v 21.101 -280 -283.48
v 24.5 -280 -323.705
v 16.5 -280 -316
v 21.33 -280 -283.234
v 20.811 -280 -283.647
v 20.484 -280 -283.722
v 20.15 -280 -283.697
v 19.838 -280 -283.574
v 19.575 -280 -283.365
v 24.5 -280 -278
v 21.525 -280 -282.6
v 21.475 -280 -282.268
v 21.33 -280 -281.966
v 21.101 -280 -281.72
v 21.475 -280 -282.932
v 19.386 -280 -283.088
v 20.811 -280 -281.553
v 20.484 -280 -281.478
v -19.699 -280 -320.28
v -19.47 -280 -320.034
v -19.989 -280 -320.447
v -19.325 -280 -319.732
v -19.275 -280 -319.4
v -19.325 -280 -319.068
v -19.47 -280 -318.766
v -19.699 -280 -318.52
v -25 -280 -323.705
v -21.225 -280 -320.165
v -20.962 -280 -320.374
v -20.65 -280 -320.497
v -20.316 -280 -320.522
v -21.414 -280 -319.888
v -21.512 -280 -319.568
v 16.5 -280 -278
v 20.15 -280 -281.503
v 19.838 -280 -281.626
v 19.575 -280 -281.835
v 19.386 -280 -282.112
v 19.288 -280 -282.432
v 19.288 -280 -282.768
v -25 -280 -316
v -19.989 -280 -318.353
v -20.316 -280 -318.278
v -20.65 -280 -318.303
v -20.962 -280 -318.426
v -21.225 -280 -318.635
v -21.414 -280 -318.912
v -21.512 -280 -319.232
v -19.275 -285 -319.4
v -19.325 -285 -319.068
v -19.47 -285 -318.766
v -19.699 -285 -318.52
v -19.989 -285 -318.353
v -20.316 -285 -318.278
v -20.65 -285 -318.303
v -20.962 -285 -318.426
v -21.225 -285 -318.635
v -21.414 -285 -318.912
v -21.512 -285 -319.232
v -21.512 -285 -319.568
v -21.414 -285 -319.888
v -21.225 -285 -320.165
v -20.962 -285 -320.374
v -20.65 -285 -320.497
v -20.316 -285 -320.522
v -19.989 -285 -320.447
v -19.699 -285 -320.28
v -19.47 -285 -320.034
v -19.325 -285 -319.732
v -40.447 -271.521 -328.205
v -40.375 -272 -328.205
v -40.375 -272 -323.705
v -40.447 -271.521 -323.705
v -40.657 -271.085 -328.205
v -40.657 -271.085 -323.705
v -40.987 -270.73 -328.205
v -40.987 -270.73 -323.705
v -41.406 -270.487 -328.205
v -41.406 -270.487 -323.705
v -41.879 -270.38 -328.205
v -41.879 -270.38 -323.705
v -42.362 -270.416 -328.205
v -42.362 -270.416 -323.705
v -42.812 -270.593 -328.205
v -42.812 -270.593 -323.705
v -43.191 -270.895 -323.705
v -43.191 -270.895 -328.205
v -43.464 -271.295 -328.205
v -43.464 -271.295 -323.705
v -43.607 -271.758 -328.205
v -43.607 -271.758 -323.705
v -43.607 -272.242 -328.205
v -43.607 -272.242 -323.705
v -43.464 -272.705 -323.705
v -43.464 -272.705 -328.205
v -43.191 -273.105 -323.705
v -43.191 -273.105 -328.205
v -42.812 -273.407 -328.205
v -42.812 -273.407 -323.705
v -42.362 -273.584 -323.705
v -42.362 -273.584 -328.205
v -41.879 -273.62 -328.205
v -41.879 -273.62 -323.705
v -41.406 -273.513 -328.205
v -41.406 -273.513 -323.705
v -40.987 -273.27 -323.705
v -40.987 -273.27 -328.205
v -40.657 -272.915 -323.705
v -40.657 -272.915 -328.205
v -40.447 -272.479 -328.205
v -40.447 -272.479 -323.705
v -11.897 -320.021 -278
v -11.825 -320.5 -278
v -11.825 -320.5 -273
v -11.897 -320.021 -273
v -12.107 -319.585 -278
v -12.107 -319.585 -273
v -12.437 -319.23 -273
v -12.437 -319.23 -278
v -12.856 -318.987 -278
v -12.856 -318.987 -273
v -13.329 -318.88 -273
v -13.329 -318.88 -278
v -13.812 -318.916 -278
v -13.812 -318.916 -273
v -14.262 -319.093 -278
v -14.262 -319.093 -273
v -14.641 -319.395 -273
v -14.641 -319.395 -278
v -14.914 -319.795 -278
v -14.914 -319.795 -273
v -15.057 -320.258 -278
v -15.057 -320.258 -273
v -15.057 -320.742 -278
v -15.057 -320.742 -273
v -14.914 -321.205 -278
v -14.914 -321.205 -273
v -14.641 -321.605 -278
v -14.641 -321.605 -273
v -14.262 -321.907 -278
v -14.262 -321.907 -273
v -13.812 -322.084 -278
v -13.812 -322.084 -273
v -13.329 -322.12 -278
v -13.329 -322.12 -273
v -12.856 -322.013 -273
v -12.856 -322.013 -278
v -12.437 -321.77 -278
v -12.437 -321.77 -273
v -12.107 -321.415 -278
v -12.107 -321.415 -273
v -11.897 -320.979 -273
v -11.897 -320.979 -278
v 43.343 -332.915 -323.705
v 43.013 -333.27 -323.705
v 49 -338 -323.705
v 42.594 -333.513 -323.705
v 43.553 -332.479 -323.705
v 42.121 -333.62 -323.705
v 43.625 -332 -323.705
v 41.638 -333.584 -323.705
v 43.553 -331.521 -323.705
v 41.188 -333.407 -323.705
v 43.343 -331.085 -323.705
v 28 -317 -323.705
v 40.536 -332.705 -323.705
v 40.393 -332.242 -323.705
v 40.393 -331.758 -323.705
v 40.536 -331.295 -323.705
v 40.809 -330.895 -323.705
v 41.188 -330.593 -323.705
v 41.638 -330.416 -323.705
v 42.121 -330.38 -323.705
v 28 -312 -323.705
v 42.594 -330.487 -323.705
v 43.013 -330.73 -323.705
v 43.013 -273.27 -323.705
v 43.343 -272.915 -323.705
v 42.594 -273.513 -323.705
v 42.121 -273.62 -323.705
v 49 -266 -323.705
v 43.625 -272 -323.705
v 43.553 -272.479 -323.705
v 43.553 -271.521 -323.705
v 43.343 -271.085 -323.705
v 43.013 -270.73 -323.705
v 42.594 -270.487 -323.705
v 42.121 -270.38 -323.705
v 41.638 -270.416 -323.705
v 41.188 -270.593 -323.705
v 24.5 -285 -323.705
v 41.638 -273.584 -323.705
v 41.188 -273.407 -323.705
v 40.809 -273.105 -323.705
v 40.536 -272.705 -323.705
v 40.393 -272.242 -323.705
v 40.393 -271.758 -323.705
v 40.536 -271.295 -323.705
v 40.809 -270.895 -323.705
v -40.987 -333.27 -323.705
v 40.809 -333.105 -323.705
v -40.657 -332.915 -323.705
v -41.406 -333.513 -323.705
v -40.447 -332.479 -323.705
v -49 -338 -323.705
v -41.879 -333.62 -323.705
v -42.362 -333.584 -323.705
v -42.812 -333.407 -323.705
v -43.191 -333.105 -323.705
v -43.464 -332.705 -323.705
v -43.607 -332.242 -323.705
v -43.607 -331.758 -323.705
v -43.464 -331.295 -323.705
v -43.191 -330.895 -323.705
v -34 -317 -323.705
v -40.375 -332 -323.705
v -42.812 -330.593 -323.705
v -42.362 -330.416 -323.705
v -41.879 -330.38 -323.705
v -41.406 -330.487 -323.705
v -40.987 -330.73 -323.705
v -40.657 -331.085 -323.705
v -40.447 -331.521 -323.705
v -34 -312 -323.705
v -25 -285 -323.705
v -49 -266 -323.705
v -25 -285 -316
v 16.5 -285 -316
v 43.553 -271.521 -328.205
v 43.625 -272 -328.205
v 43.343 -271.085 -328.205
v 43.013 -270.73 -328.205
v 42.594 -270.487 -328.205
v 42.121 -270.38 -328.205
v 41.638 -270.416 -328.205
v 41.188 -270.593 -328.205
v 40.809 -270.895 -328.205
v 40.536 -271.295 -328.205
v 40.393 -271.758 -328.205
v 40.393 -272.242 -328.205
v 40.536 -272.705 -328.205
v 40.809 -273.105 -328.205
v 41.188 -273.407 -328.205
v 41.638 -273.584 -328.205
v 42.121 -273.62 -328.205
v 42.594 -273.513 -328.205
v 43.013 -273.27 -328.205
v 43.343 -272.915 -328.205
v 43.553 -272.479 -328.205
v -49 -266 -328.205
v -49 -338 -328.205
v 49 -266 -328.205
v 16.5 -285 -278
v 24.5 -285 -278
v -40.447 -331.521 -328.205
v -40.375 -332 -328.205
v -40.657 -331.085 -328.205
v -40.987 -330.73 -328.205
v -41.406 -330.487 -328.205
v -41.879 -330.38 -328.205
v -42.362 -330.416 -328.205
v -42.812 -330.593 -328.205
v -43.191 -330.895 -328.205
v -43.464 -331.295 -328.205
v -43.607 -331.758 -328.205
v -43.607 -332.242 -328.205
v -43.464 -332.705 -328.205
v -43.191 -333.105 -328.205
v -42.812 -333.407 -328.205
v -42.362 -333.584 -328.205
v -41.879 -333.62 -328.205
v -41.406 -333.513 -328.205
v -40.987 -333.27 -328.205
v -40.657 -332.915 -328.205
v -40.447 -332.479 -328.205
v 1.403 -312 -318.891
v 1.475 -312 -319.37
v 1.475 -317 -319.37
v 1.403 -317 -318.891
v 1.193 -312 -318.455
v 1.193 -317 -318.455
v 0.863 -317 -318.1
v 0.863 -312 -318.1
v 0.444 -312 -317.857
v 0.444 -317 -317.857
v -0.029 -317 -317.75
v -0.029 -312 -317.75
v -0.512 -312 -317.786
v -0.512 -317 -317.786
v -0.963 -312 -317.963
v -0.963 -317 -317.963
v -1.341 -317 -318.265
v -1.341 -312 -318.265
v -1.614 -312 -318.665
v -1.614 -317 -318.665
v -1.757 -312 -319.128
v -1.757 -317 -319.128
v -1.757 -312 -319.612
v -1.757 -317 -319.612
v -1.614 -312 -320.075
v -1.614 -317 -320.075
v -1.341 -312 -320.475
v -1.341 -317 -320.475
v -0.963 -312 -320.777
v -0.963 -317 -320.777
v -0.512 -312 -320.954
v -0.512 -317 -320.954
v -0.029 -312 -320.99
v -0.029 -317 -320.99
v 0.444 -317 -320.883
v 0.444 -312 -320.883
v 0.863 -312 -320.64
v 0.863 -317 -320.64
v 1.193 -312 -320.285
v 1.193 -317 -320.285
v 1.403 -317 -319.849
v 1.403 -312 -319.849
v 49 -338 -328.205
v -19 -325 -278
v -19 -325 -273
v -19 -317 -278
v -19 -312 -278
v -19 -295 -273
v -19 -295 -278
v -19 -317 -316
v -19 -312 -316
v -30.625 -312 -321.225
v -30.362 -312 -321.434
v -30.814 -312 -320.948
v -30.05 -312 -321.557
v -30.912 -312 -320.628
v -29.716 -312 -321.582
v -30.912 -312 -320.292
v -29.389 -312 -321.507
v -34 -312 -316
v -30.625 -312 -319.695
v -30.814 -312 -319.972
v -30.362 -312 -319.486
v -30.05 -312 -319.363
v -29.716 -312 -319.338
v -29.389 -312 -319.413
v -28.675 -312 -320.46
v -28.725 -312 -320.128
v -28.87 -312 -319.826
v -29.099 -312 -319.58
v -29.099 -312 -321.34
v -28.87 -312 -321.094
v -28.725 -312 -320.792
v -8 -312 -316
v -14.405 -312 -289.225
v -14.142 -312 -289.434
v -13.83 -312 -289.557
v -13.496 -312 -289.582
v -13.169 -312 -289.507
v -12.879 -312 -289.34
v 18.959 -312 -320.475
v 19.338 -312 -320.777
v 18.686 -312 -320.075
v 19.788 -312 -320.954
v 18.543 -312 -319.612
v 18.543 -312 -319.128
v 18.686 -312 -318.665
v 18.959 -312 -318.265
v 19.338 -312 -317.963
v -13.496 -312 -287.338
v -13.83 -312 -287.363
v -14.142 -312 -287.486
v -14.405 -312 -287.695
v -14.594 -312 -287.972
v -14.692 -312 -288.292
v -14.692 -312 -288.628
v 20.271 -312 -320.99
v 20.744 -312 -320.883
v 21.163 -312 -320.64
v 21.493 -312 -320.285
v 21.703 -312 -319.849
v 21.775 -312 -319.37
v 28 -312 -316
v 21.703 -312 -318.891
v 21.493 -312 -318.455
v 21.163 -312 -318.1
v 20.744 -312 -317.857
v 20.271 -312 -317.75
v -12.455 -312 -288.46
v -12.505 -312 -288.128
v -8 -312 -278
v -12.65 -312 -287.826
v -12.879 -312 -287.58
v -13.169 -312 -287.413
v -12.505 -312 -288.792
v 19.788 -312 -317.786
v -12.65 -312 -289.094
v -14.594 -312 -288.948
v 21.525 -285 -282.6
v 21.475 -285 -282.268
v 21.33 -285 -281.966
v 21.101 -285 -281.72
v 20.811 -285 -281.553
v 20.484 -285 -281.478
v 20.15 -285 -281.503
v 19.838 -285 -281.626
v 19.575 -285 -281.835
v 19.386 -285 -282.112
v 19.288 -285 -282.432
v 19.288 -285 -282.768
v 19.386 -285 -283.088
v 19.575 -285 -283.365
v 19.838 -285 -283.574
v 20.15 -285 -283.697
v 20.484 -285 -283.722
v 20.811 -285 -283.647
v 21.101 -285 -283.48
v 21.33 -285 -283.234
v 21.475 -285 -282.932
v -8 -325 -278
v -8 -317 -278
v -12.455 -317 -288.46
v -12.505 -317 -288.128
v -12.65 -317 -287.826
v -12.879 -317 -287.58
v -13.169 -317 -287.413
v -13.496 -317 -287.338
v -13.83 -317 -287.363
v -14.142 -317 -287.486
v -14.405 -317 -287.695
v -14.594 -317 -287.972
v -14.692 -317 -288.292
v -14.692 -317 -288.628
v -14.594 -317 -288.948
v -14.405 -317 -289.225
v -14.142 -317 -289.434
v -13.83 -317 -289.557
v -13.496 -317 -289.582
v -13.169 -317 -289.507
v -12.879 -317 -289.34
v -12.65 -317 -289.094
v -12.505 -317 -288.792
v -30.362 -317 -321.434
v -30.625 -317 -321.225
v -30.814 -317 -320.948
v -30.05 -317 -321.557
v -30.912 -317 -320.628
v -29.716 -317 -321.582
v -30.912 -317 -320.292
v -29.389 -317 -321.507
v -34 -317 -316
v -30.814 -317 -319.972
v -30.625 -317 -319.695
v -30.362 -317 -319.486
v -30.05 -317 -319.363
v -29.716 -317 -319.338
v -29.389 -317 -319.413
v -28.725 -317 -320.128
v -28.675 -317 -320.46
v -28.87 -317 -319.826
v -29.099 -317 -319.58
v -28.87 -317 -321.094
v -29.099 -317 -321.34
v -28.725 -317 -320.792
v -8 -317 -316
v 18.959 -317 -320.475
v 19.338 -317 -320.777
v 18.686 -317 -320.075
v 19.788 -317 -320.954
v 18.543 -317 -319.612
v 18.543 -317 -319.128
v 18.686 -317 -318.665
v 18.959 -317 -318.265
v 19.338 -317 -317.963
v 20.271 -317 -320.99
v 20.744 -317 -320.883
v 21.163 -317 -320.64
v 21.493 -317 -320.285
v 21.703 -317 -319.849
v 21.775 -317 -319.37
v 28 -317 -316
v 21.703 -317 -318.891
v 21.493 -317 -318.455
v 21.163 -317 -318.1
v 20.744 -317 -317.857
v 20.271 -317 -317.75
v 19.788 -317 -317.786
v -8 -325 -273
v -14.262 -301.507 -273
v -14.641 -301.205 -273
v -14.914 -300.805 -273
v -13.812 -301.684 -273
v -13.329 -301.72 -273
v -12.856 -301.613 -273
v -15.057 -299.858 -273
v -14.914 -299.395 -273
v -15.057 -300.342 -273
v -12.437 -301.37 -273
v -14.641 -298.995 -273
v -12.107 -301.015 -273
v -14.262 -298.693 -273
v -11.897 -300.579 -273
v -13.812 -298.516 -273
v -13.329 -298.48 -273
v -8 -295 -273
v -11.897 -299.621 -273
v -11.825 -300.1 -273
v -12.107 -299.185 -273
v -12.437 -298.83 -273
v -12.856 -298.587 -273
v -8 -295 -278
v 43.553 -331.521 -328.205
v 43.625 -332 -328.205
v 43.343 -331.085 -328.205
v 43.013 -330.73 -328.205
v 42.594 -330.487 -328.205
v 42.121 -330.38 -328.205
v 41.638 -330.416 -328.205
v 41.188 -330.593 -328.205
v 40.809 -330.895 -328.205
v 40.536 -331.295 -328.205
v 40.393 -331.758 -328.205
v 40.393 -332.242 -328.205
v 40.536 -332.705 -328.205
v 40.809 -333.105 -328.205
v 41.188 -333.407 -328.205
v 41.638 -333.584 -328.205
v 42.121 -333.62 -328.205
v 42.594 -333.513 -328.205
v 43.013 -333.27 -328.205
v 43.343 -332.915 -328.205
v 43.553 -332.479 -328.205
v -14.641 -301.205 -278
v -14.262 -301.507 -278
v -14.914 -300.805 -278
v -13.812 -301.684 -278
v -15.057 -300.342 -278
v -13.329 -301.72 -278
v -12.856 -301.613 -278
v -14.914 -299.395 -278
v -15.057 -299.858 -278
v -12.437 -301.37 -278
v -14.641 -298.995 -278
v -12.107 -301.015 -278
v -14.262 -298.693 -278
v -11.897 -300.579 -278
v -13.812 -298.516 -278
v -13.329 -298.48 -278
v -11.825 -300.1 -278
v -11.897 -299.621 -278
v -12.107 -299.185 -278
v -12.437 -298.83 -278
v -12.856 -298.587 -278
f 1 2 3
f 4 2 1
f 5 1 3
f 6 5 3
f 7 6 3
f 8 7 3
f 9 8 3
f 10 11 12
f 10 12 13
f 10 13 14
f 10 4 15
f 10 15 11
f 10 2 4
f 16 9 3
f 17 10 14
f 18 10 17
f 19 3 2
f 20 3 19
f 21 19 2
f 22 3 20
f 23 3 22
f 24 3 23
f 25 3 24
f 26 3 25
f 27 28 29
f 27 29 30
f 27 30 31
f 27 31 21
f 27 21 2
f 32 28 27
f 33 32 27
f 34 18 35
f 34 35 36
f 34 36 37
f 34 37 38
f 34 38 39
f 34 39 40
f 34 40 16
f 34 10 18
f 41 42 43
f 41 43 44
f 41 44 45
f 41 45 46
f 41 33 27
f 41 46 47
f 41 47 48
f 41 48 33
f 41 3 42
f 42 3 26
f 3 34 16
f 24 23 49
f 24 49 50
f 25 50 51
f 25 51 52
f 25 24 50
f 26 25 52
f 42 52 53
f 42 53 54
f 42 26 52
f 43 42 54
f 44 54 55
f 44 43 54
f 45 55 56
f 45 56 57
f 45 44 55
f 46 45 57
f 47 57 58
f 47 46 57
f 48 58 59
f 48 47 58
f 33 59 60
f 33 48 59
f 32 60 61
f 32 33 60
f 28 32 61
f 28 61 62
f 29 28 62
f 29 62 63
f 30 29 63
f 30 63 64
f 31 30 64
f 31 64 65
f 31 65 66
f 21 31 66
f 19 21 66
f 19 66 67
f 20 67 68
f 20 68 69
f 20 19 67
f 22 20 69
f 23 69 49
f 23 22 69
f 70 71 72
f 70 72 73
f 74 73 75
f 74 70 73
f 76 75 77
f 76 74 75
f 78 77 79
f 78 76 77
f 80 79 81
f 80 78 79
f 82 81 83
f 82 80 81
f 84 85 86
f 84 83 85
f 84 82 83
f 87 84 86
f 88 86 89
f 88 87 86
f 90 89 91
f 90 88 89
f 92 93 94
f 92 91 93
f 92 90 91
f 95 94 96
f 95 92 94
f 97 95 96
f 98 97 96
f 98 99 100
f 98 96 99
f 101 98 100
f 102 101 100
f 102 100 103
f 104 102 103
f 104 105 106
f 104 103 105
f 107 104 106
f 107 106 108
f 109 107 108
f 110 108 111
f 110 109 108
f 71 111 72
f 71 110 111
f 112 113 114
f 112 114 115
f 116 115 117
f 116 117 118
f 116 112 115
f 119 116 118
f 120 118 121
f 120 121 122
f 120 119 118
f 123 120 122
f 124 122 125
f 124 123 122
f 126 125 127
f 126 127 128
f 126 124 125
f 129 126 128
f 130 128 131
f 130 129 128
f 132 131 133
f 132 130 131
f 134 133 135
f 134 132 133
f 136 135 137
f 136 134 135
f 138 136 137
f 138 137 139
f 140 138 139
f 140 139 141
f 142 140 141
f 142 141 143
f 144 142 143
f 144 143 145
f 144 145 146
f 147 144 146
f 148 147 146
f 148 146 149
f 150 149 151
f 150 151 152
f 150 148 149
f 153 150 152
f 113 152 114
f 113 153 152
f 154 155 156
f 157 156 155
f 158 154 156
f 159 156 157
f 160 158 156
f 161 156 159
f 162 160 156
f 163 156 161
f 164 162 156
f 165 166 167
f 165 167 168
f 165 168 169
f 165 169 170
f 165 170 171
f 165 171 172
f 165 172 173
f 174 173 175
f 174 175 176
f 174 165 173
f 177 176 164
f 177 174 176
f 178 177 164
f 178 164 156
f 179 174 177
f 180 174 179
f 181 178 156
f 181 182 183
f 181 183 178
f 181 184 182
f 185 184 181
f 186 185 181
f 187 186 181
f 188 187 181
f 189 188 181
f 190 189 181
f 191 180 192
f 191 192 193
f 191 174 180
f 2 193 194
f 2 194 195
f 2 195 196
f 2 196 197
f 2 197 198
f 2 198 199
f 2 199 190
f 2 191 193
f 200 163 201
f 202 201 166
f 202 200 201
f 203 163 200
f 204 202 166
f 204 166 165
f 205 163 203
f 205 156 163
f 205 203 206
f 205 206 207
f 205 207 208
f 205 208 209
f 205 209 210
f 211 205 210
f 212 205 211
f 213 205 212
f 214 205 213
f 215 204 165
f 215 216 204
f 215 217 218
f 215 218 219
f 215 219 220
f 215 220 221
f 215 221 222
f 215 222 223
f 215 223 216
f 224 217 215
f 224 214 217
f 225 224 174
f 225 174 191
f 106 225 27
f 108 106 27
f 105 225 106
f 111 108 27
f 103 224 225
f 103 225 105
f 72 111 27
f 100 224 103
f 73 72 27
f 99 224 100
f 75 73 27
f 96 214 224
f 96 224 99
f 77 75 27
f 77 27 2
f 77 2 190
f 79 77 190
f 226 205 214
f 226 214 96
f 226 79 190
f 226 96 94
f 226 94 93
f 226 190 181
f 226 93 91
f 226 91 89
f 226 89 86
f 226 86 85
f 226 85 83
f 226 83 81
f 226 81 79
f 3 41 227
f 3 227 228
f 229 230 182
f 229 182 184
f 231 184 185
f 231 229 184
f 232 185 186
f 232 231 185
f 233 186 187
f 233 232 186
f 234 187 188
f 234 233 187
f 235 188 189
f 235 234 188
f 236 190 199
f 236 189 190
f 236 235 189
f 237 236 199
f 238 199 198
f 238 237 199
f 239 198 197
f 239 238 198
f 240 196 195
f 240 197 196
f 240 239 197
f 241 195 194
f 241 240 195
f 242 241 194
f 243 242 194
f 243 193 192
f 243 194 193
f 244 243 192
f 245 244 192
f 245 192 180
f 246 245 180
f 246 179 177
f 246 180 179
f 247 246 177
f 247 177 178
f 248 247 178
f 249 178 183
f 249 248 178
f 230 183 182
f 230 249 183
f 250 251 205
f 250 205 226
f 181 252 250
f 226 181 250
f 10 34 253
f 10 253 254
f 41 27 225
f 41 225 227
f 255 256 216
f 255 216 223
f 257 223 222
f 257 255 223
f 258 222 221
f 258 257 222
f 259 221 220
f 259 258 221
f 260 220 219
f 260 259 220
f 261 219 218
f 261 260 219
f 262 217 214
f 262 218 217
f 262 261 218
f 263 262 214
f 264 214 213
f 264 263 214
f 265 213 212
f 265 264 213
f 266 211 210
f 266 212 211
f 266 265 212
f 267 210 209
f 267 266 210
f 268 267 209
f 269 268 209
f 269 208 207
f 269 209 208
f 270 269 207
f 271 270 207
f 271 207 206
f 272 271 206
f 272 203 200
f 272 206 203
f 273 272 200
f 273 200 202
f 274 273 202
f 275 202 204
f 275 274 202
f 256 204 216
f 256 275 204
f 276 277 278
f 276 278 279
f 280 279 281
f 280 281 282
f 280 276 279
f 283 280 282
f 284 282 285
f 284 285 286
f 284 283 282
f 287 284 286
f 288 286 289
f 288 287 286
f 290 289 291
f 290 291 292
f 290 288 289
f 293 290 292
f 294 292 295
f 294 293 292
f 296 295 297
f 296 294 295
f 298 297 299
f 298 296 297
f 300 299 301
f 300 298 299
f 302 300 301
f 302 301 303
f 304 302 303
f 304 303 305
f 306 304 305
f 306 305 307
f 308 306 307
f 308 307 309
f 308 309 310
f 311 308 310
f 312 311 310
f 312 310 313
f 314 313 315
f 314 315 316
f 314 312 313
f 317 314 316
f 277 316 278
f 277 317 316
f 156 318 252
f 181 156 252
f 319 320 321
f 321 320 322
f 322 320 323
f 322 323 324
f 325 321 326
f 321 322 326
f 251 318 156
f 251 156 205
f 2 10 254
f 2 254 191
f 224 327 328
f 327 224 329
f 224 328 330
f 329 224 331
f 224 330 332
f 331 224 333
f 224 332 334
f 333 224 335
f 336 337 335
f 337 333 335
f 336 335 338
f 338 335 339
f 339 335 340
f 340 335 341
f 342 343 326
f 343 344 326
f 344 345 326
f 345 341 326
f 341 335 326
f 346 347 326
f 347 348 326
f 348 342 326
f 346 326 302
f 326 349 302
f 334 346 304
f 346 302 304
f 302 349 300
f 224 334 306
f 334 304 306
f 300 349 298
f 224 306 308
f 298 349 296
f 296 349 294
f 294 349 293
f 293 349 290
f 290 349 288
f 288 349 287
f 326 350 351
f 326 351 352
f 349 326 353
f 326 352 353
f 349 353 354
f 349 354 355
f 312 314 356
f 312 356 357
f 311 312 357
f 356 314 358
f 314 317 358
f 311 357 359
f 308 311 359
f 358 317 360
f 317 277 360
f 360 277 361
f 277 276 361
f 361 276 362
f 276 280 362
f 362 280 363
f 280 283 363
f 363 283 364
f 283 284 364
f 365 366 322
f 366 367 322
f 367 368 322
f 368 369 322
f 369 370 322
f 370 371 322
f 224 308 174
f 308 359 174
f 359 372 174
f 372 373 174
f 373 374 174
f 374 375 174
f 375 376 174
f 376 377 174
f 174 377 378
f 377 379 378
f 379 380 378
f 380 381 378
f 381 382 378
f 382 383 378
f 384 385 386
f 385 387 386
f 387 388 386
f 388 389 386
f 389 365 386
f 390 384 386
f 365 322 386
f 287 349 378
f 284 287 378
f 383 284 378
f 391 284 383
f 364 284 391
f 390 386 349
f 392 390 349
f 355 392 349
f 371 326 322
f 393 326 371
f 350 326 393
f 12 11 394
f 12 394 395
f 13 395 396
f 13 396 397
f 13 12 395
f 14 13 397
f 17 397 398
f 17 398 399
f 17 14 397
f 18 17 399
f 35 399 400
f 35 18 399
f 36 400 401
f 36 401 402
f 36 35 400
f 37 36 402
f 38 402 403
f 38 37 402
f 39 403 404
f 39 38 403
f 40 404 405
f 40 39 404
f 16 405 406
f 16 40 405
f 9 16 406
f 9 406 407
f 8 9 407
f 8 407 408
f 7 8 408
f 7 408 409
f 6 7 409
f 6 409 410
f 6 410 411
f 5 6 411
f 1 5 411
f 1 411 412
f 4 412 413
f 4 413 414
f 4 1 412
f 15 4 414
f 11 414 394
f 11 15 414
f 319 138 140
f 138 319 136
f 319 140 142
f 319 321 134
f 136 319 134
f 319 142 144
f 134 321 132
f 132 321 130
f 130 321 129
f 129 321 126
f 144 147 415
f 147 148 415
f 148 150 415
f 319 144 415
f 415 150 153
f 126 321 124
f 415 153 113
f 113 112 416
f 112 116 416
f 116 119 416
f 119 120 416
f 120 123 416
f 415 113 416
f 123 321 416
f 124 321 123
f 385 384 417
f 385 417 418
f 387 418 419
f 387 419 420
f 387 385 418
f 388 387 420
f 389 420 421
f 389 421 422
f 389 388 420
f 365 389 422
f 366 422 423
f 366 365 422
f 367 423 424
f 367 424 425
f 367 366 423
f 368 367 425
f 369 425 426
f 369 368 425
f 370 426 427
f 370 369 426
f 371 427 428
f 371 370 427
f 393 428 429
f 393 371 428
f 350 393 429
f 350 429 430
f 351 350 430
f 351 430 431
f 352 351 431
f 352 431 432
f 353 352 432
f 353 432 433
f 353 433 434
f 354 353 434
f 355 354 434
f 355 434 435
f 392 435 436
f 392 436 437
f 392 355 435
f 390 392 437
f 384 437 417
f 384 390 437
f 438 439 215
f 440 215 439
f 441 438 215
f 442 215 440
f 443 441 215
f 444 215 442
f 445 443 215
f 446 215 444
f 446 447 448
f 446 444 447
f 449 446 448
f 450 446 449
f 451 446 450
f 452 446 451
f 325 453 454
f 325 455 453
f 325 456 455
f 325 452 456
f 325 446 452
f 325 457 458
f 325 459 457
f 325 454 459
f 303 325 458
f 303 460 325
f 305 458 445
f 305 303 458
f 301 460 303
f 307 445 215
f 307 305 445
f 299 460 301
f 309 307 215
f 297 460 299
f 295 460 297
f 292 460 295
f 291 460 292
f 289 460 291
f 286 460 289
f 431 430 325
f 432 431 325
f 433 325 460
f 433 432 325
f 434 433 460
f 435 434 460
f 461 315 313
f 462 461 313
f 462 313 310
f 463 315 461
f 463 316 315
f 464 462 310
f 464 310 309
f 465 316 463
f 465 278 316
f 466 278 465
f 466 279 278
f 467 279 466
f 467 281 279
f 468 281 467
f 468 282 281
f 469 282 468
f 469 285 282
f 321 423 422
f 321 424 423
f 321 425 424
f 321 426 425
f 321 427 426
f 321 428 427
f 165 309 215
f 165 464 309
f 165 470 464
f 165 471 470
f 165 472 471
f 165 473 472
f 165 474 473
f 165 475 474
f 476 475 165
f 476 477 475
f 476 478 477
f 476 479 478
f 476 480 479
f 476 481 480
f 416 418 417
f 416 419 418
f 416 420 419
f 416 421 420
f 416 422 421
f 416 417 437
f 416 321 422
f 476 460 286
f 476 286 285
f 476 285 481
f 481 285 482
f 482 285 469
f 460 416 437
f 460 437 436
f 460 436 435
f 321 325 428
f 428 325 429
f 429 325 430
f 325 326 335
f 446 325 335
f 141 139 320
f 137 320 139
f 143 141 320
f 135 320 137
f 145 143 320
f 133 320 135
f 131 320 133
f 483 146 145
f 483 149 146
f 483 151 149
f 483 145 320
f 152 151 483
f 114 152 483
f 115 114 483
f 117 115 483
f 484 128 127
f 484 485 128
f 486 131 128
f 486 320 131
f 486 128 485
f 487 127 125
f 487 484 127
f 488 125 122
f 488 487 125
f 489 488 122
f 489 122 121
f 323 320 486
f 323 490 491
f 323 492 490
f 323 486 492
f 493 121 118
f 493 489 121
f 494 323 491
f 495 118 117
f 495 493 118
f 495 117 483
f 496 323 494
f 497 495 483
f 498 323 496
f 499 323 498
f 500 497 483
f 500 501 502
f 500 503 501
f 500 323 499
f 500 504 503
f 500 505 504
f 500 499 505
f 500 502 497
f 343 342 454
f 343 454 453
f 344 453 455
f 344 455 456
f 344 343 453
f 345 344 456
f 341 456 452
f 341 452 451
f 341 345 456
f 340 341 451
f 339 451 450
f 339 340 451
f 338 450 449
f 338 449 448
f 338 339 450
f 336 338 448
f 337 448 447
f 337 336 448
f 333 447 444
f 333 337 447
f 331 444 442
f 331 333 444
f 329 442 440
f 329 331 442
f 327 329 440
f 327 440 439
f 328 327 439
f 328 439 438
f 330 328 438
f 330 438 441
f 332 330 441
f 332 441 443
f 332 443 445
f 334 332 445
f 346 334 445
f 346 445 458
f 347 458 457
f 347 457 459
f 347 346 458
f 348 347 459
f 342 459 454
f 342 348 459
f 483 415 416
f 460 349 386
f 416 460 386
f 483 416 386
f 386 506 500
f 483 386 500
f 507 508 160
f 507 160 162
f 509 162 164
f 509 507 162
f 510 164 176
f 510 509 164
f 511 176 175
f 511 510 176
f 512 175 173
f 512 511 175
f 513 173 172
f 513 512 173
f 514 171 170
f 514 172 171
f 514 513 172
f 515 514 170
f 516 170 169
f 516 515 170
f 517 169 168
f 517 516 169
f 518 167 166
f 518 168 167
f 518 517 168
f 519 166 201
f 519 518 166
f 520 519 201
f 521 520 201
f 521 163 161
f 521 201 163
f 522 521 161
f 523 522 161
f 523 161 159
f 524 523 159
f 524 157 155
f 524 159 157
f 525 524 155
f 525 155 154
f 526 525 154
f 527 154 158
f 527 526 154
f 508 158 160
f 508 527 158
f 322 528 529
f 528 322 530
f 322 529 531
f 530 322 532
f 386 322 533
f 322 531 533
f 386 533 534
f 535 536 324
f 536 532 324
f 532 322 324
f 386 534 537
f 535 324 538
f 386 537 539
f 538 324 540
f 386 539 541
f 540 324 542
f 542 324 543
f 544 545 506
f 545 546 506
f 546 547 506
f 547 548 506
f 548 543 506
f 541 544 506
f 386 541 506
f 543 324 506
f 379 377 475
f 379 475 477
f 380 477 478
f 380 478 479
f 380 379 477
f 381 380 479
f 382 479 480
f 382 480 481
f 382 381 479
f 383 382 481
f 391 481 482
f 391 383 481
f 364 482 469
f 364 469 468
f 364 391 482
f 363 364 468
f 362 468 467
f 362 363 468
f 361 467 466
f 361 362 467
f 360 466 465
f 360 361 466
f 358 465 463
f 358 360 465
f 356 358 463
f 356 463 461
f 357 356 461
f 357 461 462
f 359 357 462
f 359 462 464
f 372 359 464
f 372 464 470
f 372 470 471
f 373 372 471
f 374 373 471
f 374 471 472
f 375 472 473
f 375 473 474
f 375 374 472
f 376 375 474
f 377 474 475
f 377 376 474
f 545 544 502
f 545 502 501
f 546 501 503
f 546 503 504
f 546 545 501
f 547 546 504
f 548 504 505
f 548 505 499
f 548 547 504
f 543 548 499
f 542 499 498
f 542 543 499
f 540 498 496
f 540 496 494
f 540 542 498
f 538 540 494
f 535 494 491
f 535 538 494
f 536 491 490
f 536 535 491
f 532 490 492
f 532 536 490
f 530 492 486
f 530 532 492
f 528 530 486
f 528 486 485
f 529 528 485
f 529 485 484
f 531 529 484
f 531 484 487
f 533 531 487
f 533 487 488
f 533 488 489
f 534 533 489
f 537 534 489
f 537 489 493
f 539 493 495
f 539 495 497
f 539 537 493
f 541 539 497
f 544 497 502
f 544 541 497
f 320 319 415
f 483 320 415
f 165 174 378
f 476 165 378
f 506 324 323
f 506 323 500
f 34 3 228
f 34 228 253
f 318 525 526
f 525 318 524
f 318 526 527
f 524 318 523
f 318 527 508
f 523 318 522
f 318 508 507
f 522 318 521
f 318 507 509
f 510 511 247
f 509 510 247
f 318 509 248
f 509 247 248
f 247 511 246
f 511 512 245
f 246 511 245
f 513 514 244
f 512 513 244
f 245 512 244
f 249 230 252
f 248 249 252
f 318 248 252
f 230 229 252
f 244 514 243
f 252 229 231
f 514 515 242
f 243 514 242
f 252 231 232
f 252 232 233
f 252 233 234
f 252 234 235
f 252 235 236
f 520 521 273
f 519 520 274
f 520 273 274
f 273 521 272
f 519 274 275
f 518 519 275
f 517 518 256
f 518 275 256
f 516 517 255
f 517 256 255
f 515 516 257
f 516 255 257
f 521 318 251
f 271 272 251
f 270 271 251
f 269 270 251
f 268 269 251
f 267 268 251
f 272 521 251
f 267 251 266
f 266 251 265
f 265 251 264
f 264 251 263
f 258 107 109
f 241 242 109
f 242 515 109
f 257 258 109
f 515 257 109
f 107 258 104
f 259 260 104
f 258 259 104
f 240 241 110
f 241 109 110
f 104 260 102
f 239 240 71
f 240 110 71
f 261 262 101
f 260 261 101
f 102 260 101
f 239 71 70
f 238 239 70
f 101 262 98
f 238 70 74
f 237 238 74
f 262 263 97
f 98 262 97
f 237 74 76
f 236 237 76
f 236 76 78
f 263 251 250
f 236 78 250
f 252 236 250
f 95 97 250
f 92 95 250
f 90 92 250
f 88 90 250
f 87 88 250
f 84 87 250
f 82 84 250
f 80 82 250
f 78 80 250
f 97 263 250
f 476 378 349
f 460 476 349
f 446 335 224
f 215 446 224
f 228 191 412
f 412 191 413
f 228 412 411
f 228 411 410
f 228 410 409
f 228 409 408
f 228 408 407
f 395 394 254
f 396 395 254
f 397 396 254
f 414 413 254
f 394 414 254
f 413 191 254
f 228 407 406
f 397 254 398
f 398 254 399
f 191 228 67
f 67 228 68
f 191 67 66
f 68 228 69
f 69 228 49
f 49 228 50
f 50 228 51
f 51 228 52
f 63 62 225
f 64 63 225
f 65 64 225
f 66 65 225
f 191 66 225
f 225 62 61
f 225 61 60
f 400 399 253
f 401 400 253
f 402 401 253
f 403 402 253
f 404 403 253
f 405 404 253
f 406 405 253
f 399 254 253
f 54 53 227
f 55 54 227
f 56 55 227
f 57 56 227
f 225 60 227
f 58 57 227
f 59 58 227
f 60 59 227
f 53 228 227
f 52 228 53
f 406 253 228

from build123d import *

# Parameters (mm, degrees)
SKETCH035_R                               = 1.625
EXTRUDE011_DEPTH                          = 20
SKETCH020_W                               = 11
SKETCH020_H                               = 30
SKETCH020_R                               = 1.625
EXTRUDE004_DEPTH                          = 5
SKETCH022_AS_DRAWN_W                      = 72
SKETCH022_AS_DRAWN_H                      = 98
EXTRUDE006_DEPTH                          = 4.5
EXTRUDE006_ONTO_SKETCH022_ROLL_ANGLE      = 0
EXTRUDE006_ONTO_SKETCH022_PITCH_ANGLE     = 0
EXTRUDE006_ONTO_SKETCH022_PLACEMENT_ANGLE = 90.000003
SKETCH019_R                               = 1.125
SKETCH019_R_2                             = 1.625
EXTRUDE003_DEPTH                          = 5
SKETCH021_R                               = 1.125
EXTRUDE005_DEPTH                          = 5


with BuildPart() as basecuts001:
    # Sketch035 → Extrude011 (new body)
    with BuildSketch(Plane.XY):
        with Locations((-42, -332)):
            Circle(SKETCH035_R)
        with Locations((42, -332)):
            Circle(SKETCH035_R)
        with Locations((42, -272)):
            Circle(SKETCH035_R)
        with Locations((-42, -272)):
            Circle(SKETCH035_R)
    extrude(amount=EXTRUDE011_DEPTH)


with BuildPart() as basecuts001_1:
    # Extrude011 placement: moved
    add(basecuts001.part.moved(Location((0, 0, -329))))


with BuildPart() as gpshold:
    # Sketch020 → Extrude004 (new body)
    with BuildSketch(Plane.XY):
        with Locations((-13.5, -310)):
            Rectangle(SKETCH020_W, SKETCH020_H)
        with Locations((-13.45, -300.1)):
            Circle(SKETCH020_R, mode=Mode.SUBTRACT)
        with Locations((-13.45, -320.5)):
            Circle(SKETCH020_R, mode=Mode.SUBTRACT)
    extrude(amount=EXTRUDE004_DEPTH)


with BuildPart() as gpshold_1:
    # Extrude004 placement: moved
    add(gpshold.part.moved(Location((0, 0, -278))))


with BuildPart() as base:
    # Sketch022 as drawn → Extrude006 (new)
    with BuildSketch(Plane.XY):
        Rectangle(SKETCH022_AS_DRAWN_W, SKETCH022_AS_DRAWN_H)
    extrude(amount=EXTRUDE006_DEPTH)


with BuildPart() as base_1:
    # Extrude006 onto Sketch022 roll: moved
    add(base.part.rotate(Axis((0, 0, 0), (1, 0, 0)), EXTRUDE006_ONTO_SKETCH022_ROLL_ANGLE))


with BuildPart() as base_2:
    # Extrude006 onto Sketch022 pitch: moved
    add(base_1.part.rotate(Axis((0, 0, 0), (0, 1, 0)), EXTRUDE006_ONTO_SKETCH022_PITCH_ANGLE))


with BuildPart() as base_3:
    # Extrude006 onto Sketch022 placement: moved
    add(base_2.part.moved(Location((0, -302, -283.455178))).rotate(Axis((0, -302, -283.455178), (0, 0, 1)), EXTRUDE006_ONTO_SKETCH022_PLACEMENT_ANGLE))


with BuildPart() as base_4:
    # Extrude006 placement: moved
    add(base_3.part.moved(Location((0, 0, -44.75))))


with BuildPart() as i2chold:
    # Sketch019 → Extrude003 (new body)
    with BuildSketch(Plane.XZ):
        Polygon((28, -324), (28, -316), (-8, -316), (-8, -278), (-19, -278), (-19, -316), (-34, -316), (-34, -324), align=None)
        with Locations((-29.8, -320.46)):
            Circle(SKETCH019_R, mode=Mode.SUBTRACT)
        with Locations((-13.58, -288.46)):
            Circle(SKETCH019_R, mode=Mode.SUBTRACT)
        with Locations((-0.15, -319.37)):
            Circle(SKETCH019_R_2, mode=Mode.SUBTRACT)
        with Locations((20.15, -319.37)):
            Circle(SKETCH019_R_2, mode=Mode.SUBTRACT)
    extrude(amount=EXTRUDE003_DEPTH)


with BuildPart() as i2chold_1:
    # Extrude003 placement: moved
    add(i2chold.part.moved(Location((0, -312, 0))))


with BuildPart() as base002:
    # Sketch021 (on Extrude) → Extrude005 (new body)
    with BuildSketch(Plane.XZ.offset(312)):
        Polygon((-25, -324), (-25, -316), (16.5, -316), (16.5, -278), (24.5, -278), (24.5, -324), align=None)
        with Locations((-20.4, -319.4)):
            Circle(SKETCH021_R, mode=Mode.SUBTRACT)
        with Locations((20.4, -282.6)):
            Circle(SKETCH021_R, mode=Mode.SUBTRACT)
    extrude(amount=EXTRUDE005_DEPTH)


with BuildPart() as base002_1:
    # Extrude005 placement: moved
    add(base002.part.moved(Location((0, 32, 0))))

    # Fusion038: union gpsHold, base, i2cHold
    add(gpshold_1.part)
    add(base_4.part)
    add(i2chold_1.part)

    # Cut019: cut baseCuts001
    add(basecuts001_1.part, mode=Mode.SUBTRACT)


solid = base002_1.part
